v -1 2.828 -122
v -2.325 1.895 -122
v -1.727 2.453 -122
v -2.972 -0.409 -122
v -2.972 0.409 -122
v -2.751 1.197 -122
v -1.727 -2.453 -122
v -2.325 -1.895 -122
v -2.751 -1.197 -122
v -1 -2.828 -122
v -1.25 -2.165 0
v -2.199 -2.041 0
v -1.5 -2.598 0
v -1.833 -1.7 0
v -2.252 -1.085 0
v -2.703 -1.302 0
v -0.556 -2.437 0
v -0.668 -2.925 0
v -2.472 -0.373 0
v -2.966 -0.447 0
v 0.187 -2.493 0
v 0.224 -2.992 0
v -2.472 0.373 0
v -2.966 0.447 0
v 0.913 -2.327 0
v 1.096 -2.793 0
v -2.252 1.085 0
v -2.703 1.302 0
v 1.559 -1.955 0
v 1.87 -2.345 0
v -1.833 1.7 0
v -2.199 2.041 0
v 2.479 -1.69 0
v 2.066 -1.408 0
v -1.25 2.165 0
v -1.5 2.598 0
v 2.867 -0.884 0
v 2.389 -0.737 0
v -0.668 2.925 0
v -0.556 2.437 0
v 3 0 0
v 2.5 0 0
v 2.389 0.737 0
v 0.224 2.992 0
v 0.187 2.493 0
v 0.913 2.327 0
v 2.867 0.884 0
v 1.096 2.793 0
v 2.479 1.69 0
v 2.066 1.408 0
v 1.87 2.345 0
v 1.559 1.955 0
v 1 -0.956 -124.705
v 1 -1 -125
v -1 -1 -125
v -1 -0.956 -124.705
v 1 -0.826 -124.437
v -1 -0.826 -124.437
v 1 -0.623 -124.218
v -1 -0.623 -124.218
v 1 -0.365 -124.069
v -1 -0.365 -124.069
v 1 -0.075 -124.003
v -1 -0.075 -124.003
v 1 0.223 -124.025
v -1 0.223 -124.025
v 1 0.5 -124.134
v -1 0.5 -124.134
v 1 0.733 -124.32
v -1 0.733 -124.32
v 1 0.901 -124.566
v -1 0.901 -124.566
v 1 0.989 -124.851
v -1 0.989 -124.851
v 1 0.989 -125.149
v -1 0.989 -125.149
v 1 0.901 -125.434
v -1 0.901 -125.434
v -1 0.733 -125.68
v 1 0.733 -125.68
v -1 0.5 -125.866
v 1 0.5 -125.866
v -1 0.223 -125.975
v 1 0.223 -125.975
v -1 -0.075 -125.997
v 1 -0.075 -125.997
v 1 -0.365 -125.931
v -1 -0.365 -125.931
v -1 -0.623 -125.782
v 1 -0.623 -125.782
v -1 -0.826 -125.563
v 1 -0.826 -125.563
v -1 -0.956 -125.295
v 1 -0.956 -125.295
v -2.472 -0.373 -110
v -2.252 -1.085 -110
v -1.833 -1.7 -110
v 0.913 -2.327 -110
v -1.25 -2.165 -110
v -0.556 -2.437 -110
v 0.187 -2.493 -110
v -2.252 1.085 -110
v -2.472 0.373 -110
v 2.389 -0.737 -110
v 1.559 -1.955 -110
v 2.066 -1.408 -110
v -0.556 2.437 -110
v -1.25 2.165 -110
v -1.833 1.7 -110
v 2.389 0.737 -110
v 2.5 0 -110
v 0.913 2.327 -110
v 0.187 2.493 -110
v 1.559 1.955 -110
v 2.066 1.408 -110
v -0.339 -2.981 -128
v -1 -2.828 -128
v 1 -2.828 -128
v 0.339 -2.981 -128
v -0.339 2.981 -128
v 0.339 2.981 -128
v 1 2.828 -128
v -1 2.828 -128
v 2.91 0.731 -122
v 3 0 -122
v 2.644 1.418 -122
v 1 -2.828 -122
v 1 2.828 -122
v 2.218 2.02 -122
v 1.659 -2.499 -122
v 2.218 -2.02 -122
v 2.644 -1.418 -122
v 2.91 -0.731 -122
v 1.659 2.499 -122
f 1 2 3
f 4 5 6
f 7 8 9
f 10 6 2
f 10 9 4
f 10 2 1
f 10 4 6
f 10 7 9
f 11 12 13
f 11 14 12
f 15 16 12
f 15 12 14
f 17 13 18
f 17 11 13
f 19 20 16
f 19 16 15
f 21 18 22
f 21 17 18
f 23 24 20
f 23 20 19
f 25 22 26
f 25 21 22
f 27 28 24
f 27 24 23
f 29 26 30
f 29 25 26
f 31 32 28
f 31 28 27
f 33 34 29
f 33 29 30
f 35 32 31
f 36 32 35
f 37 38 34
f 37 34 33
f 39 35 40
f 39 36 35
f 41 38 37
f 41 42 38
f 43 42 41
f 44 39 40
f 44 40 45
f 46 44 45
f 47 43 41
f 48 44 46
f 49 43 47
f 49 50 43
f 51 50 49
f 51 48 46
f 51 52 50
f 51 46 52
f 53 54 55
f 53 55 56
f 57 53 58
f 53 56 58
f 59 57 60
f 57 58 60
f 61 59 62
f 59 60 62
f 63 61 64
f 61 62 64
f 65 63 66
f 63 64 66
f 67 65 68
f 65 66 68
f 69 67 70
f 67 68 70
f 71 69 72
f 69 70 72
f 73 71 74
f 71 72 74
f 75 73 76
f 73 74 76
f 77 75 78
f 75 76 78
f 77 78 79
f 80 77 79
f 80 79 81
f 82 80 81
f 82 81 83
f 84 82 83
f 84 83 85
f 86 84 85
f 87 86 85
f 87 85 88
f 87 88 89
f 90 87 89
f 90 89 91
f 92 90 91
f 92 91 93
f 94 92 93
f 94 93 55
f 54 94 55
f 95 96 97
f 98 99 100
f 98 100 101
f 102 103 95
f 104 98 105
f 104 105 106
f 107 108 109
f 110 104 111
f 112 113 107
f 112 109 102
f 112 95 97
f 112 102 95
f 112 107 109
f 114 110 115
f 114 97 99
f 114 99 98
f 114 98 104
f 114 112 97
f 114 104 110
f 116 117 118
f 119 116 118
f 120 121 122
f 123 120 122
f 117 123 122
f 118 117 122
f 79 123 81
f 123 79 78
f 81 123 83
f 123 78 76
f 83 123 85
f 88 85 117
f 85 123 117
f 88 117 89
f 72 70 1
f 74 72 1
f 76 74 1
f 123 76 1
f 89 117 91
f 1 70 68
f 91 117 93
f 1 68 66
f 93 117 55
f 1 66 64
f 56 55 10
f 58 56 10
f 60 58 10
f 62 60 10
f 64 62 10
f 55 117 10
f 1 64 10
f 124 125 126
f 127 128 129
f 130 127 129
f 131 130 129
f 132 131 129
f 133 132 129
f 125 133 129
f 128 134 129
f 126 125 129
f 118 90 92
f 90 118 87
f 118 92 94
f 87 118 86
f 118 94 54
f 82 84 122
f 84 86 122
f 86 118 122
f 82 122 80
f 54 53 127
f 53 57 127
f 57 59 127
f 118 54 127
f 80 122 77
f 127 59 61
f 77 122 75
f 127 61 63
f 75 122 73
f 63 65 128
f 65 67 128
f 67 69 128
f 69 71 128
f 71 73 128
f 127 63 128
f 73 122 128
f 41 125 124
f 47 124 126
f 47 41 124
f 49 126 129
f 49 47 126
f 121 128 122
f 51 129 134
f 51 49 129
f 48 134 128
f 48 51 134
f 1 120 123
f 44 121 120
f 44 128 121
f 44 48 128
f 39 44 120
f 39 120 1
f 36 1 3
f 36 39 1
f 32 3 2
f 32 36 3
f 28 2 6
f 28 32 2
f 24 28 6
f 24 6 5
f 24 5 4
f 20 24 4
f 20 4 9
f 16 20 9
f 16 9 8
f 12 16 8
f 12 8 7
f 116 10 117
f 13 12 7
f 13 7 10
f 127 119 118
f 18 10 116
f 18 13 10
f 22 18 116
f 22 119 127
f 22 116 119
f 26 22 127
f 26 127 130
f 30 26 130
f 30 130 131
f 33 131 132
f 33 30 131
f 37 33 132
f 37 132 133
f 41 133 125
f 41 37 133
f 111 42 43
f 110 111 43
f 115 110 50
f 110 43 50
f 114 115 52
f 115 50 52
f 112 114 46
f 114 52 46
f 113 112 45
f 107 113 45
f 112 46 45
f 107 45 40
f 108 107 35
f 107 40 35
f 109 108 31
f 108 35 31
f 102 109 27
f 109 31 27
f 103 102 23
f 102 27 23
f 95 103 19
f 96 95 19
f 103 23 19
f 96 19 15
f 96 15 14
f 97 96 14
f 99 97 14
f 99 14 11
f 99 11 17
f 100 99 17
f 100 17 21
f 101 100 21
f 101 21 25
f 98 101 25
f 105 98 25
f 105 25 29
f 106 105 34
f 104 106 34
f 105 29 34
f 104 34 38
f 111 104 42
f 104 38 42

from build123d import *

# Parameters (mm, degrees)
F0_R     = 3
F1_DEPTH = 128
F2_R     = 2.5
F3_DEPTH = 110
F4_W     = 3.289427
F4_H     = 6.793895
F4_W_2   = 3.708657
F4_H_2   = 6.848642
F5_DEPTH = 12.5
F6_R     = 1
F7_DEPTH = 25


with BuildPart() as f1:
    # F0 (on Top) → F1 (new body)
    with BuildSketch(Plane.XY):
        Circle(F0_R)
    extrude(amount=-F1_DEPTH)

    # F2 (on face) → F3 (cut)
    with BuildSketch(Plane.XY):
        Circle(F2_R)
    extrude(amount=-F3_DEPTH, mode=Mode.SUBTRACT)

    # F4 (on Front) → F5 (cut, symmetric)
    with BuildSketch(Plane.XZ):
        with Locations((2.644713, -125.396947)):
            Rectangle(F4_W, F4_H)
        with Locations((-2.854328, -125.424321)):
            Rectangle(F4_W_2, F4_H_2)
    extrude(amount=F5_DEPTH, both=True, mode=Mode.SUBTRACT)

    # F6 (on face) → F7 (cut)
    with BuildSketch(Plane(origin=(-1, 0, 0), x_dir=(0, -1, 0), z_dir=(-1, 0, 0))):
        with Locations((0, -125)):
            Circle(F6_R)
    extrude(amount=-F7_DEPTH, mode=Mode.SUBTRACT)


solid = f1.part
